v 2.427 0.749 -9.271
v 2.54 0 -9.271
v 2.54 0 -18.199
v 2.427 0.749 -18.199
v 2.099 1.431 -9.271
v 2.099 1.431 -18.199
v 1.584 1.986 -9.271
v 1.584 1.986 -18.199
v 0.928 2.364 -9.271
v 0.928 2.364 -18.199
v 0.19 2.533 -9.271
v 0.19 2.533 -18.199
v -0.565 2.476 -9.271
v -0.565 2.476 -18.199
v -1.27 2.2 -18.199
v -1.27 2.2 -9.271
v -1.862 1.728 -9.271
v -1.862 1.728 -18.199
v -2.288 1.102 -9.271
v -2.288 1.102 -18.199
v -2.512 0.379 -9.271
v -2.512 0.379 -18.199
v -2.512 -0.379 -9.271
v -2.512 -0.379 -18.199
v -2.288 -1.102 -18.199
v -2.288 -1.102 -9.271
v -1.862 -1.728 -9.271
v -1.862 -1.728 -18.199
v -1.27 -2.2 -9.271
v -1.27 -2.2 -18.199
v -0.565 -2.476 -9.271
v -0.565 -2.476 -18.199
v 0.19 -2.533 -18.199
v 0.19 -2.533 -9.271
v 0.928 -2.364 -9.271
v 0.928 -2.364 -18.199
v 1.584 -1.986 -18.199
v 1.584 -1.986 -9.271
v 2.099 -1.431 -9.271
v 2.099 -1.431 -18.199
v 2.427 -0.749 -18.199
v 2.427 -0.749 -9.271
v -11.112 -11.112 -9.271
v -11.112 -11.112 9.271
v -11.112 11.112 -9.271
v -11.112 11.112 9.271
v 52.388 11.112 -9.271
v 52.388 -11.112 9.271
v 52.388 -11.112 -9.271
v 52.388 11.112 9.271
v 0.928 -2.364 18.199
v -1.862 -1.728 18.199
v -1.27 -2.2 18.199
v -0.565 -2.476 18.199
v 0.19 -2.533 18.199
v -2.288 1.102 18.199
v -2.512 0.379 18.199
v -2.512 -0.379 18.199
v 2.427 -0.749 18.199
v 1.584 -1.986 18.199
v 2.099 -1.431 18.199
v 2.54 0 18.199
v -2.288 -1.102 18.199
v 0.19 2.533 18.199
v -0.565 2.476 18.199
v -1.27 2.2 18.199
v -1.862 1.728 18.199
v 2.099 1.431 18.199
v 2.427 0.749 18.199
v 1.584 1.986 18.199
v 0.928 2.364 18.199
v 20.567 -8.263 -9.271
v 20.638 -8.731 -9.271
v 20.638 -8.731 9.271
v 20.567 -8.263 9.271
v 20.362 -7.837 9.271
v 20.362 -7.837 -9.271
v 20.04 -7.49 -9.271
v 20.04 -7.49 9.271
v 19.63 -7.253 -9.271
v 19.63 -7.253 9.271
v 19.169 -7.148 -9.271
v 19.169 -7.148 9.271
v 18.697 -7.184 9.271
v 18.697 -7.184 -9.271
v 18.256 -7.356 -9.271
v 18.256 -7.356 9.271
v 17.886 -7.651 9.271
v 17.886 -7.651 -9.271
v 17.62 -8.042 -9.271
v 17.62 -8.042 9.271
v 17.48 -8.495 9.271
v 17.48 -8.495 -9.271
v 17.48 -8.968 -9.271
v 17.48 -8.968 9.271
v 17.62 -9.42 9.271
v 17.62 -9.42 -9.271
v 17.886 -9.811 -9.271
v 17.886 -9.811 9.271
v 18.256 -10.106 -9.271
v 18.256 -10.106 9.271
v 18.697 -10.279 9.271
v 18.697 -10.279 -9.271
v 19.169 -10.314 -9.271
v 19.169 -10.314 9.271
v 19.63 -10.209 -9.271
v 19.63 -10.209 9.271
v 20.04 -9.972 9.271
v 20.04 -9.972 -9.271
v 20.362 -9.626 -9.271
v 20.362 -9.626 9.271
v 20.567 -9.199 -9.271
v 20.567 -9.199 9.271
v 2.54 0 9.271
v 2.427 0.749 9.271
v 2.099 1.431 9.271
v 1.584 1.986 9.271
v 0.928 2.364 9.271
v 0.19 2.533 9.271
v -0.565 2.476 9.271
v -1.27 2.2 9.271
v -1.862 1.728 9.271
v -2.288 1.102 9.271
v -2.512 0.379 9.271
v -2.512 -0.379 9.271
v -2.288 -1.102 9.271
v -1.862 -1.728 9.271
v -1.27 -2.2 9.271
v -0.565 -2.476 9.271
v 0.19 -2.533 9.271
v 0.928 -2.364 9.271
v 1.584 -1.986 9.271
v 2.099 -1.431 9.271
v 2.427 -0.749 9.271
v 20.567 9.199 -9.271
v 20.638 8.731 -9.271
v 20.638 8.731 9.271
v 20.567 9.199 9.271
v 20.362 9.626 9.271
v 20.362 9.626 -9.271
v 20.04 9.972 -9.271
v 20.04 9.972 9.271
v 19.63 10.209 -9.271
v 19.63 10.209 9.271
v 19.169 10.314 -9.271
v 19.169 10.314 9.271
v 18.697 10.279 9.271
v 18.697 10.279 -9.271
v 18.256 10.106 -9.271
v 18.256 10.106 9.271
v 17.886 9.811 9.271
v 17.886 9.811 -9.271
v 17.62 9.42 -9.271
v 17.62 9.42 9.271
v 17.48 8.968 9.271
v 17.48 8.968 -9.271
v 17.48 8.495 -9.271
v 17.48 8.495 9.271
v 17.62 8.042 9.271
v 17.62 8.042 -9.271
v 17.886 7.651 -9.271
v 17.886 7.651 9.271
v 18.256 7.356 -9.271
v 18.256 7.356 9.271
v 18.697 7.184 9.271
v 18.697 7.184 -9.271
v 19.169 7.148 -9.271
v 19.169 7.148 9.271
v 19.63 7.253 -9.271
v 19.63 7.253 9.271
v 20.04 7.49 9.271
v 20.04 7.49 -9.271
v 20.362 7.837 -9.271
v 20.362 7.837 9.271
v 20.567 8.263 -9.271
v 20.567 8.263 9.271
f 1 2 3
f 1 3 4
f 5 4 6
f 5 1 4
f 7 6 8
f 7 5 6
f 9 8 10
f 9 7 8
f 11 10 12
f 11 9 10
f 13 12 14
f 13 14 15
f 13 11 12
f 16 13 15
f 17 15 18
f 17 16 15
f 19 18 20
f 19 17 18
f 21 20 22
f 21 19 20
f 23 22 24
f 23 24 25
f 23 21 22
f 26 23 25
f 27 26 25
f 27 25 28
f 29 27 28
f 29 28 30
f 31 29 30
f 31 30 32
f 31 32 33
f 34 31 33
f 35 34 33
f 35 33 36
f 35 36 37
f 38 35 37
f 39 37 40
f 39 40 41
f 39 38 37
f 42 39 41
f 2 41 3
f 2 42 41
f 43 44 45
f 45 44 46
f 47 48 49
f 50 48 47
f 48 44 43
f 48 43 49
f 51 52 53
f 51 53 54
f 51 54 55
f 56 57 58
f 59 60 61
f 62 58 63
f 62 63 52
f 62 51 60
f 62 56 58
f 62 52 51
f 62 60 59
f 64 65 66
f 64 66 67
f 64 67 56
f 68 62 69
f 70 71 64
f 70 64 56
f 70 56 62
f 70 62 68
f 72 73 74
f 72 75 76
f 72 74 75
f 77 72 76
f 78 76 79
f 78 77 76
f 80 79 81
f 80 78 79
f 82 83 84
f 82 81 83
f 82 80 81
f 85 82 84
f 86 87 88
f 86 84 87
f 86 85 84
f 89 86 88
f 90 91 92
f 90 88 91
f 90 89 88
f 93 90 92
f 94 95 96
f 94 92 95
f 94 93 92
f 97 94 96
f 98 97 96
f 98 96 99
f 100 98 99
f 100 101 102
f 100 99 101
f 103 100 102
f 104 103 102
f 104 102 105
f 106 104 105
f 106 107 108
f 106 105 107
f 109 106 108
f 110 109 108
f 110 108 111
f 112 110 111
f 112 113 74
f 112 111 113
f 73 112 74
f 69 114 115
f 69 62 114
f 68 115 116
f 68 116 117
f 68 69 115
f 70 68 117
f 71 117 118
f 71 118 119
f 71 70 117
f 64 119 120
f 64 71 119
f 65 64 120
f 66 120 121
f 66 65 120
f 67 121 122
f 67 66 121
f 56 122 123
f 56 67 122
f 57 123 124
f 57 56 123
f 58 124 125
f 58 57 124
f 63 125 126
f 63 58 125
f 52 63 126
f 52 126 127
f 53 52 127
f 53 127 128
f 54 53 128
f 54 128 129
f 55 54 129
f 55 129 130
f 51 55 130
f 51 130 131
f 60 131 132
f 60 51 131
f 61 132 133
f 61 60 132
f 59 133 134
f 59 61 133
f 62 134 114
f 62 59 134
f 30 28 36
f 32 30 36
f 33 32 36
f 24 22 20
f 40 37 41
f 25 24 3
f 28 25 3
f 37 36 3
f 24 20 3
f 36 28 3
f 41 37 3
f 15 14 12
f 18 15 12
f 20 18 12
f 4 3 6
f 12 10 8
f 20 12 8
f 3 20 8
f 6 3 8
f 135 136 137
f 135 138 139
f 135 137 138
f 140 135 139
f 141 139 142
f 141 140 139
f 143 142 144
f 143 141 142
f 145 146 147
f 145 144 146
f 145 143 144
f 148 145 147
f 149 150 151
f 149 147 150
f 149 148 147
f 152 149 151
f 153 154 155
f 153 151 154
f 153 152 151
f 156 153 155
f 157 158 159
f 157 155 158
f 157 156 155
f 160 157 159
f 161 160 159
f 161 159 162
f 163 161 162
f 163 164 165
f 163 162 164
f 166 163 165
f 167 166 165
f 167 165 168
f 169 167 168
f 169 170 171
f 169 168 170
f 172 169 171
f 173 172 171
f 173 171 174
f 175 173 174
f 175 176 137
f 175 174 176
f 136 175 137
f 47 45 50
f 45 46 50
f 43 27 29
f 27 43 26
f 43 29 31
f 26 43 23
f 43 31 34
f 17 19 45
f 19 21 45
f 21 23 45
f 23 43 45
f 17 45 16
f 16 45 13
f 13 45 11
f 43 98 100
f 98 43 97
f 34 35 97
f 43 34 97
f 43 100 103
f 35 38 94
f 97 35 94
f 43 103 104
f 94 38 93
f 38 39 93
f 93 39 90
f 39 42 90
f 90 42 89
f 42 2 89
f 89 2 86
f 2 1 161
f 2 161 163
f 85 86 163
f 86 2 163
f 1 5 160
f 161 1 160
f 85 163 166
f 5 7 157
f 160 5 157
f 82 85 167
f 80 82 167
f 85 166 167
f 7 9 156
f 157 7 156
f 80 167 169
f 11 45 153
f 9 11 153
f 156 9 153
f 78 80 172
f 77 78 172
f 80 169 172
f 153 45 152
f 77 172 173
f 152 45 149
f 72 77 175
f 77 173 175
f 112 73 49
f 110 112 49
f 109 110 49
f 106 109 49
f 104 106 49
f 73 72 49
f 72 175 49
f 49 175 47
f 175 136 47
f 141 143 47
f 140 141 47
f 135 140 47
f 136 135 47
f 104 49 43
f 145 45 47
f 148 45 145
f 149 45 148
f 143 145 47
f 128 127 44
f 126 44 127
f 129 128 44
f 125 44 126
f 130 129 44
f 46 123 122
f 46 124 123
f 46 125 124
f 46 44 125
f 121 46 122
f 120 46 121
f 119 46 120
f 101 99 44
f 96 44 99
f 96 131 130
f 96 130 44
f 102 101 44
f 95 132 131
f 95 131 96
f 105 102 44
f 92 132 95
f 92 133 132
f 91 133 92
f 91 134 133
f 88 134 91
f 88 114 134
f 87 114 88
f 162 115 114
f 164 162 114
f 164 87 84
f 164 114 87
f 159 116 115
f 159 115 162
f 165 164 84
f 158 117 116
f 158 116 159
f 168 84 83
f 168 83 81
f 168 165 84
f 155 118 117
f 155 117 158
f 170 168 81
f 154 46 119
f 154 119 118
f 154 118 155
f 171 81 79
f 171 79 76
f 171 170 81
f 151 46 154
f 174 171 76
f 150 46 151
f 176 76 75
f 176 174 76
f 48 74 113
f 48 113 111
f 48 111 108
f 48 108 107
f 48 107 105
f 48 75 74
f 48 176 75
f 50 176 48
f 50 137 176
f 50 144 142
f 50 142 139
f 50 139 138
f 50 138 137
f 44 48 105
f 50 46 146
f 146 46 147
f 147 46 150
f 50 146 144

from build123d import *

# Parameters (mm, degrees)
SKETCH1_R               = 2.54
BOSS_EXTRUDE1_DEPTH     = 18.1991
SKETCH2_W               = 63.5
SKETCH2_H               = 22.225
BOSS_EXTRUDE2_DEPTH     = 9.271
CUT_EXTRUDE1_DEPTH      = 61.187575184
CUT_EXTRUDE1_DEPTH_BACK = 61.187575184
SKETCH3_R               = 1.5875


with BuildPart() as part:
    # Sketch1 → Boss-Extrude1 (new, symmetric)
    with BuildSketch(Plane.XY):
        Circle(SKETCH1_R)
    extrude(amount=BOSS_EXTRUDE1_DEPTH, both=True)

    # Sketch2 → Boss-Extrude2 (add, symmetric)
    with BuildSketch(Plane.XY):
        with Locations((20.6375, 0)):
            Rectangle(SKETCH2_W, SKETCH2_H)
    extrude(amount=BOSS_EXTRUDE2_DEPTH, both=True)

    # Sketch3 → Cut-Extrude1 (cut, two sides: drawn at the far end of the back side and taken through both)
    with BuildSketch(Plane.XY.offset(9.271).offset(-CUT_EXTRUDE1_DEPTH_BACK)):
        with Locations((19.05, -8.73125)):
            Circle(SKETCH3_R)
        with Locations((19.05, 8.73125)):
            Circle(SKETCH3_R)
    extrude(amount=CUT_EXTRUDE1_DEPTH + CUT_EXTRUDE1_DEPTH_BACK, mode=Mode.SUBTRACT)


solid = part.part
